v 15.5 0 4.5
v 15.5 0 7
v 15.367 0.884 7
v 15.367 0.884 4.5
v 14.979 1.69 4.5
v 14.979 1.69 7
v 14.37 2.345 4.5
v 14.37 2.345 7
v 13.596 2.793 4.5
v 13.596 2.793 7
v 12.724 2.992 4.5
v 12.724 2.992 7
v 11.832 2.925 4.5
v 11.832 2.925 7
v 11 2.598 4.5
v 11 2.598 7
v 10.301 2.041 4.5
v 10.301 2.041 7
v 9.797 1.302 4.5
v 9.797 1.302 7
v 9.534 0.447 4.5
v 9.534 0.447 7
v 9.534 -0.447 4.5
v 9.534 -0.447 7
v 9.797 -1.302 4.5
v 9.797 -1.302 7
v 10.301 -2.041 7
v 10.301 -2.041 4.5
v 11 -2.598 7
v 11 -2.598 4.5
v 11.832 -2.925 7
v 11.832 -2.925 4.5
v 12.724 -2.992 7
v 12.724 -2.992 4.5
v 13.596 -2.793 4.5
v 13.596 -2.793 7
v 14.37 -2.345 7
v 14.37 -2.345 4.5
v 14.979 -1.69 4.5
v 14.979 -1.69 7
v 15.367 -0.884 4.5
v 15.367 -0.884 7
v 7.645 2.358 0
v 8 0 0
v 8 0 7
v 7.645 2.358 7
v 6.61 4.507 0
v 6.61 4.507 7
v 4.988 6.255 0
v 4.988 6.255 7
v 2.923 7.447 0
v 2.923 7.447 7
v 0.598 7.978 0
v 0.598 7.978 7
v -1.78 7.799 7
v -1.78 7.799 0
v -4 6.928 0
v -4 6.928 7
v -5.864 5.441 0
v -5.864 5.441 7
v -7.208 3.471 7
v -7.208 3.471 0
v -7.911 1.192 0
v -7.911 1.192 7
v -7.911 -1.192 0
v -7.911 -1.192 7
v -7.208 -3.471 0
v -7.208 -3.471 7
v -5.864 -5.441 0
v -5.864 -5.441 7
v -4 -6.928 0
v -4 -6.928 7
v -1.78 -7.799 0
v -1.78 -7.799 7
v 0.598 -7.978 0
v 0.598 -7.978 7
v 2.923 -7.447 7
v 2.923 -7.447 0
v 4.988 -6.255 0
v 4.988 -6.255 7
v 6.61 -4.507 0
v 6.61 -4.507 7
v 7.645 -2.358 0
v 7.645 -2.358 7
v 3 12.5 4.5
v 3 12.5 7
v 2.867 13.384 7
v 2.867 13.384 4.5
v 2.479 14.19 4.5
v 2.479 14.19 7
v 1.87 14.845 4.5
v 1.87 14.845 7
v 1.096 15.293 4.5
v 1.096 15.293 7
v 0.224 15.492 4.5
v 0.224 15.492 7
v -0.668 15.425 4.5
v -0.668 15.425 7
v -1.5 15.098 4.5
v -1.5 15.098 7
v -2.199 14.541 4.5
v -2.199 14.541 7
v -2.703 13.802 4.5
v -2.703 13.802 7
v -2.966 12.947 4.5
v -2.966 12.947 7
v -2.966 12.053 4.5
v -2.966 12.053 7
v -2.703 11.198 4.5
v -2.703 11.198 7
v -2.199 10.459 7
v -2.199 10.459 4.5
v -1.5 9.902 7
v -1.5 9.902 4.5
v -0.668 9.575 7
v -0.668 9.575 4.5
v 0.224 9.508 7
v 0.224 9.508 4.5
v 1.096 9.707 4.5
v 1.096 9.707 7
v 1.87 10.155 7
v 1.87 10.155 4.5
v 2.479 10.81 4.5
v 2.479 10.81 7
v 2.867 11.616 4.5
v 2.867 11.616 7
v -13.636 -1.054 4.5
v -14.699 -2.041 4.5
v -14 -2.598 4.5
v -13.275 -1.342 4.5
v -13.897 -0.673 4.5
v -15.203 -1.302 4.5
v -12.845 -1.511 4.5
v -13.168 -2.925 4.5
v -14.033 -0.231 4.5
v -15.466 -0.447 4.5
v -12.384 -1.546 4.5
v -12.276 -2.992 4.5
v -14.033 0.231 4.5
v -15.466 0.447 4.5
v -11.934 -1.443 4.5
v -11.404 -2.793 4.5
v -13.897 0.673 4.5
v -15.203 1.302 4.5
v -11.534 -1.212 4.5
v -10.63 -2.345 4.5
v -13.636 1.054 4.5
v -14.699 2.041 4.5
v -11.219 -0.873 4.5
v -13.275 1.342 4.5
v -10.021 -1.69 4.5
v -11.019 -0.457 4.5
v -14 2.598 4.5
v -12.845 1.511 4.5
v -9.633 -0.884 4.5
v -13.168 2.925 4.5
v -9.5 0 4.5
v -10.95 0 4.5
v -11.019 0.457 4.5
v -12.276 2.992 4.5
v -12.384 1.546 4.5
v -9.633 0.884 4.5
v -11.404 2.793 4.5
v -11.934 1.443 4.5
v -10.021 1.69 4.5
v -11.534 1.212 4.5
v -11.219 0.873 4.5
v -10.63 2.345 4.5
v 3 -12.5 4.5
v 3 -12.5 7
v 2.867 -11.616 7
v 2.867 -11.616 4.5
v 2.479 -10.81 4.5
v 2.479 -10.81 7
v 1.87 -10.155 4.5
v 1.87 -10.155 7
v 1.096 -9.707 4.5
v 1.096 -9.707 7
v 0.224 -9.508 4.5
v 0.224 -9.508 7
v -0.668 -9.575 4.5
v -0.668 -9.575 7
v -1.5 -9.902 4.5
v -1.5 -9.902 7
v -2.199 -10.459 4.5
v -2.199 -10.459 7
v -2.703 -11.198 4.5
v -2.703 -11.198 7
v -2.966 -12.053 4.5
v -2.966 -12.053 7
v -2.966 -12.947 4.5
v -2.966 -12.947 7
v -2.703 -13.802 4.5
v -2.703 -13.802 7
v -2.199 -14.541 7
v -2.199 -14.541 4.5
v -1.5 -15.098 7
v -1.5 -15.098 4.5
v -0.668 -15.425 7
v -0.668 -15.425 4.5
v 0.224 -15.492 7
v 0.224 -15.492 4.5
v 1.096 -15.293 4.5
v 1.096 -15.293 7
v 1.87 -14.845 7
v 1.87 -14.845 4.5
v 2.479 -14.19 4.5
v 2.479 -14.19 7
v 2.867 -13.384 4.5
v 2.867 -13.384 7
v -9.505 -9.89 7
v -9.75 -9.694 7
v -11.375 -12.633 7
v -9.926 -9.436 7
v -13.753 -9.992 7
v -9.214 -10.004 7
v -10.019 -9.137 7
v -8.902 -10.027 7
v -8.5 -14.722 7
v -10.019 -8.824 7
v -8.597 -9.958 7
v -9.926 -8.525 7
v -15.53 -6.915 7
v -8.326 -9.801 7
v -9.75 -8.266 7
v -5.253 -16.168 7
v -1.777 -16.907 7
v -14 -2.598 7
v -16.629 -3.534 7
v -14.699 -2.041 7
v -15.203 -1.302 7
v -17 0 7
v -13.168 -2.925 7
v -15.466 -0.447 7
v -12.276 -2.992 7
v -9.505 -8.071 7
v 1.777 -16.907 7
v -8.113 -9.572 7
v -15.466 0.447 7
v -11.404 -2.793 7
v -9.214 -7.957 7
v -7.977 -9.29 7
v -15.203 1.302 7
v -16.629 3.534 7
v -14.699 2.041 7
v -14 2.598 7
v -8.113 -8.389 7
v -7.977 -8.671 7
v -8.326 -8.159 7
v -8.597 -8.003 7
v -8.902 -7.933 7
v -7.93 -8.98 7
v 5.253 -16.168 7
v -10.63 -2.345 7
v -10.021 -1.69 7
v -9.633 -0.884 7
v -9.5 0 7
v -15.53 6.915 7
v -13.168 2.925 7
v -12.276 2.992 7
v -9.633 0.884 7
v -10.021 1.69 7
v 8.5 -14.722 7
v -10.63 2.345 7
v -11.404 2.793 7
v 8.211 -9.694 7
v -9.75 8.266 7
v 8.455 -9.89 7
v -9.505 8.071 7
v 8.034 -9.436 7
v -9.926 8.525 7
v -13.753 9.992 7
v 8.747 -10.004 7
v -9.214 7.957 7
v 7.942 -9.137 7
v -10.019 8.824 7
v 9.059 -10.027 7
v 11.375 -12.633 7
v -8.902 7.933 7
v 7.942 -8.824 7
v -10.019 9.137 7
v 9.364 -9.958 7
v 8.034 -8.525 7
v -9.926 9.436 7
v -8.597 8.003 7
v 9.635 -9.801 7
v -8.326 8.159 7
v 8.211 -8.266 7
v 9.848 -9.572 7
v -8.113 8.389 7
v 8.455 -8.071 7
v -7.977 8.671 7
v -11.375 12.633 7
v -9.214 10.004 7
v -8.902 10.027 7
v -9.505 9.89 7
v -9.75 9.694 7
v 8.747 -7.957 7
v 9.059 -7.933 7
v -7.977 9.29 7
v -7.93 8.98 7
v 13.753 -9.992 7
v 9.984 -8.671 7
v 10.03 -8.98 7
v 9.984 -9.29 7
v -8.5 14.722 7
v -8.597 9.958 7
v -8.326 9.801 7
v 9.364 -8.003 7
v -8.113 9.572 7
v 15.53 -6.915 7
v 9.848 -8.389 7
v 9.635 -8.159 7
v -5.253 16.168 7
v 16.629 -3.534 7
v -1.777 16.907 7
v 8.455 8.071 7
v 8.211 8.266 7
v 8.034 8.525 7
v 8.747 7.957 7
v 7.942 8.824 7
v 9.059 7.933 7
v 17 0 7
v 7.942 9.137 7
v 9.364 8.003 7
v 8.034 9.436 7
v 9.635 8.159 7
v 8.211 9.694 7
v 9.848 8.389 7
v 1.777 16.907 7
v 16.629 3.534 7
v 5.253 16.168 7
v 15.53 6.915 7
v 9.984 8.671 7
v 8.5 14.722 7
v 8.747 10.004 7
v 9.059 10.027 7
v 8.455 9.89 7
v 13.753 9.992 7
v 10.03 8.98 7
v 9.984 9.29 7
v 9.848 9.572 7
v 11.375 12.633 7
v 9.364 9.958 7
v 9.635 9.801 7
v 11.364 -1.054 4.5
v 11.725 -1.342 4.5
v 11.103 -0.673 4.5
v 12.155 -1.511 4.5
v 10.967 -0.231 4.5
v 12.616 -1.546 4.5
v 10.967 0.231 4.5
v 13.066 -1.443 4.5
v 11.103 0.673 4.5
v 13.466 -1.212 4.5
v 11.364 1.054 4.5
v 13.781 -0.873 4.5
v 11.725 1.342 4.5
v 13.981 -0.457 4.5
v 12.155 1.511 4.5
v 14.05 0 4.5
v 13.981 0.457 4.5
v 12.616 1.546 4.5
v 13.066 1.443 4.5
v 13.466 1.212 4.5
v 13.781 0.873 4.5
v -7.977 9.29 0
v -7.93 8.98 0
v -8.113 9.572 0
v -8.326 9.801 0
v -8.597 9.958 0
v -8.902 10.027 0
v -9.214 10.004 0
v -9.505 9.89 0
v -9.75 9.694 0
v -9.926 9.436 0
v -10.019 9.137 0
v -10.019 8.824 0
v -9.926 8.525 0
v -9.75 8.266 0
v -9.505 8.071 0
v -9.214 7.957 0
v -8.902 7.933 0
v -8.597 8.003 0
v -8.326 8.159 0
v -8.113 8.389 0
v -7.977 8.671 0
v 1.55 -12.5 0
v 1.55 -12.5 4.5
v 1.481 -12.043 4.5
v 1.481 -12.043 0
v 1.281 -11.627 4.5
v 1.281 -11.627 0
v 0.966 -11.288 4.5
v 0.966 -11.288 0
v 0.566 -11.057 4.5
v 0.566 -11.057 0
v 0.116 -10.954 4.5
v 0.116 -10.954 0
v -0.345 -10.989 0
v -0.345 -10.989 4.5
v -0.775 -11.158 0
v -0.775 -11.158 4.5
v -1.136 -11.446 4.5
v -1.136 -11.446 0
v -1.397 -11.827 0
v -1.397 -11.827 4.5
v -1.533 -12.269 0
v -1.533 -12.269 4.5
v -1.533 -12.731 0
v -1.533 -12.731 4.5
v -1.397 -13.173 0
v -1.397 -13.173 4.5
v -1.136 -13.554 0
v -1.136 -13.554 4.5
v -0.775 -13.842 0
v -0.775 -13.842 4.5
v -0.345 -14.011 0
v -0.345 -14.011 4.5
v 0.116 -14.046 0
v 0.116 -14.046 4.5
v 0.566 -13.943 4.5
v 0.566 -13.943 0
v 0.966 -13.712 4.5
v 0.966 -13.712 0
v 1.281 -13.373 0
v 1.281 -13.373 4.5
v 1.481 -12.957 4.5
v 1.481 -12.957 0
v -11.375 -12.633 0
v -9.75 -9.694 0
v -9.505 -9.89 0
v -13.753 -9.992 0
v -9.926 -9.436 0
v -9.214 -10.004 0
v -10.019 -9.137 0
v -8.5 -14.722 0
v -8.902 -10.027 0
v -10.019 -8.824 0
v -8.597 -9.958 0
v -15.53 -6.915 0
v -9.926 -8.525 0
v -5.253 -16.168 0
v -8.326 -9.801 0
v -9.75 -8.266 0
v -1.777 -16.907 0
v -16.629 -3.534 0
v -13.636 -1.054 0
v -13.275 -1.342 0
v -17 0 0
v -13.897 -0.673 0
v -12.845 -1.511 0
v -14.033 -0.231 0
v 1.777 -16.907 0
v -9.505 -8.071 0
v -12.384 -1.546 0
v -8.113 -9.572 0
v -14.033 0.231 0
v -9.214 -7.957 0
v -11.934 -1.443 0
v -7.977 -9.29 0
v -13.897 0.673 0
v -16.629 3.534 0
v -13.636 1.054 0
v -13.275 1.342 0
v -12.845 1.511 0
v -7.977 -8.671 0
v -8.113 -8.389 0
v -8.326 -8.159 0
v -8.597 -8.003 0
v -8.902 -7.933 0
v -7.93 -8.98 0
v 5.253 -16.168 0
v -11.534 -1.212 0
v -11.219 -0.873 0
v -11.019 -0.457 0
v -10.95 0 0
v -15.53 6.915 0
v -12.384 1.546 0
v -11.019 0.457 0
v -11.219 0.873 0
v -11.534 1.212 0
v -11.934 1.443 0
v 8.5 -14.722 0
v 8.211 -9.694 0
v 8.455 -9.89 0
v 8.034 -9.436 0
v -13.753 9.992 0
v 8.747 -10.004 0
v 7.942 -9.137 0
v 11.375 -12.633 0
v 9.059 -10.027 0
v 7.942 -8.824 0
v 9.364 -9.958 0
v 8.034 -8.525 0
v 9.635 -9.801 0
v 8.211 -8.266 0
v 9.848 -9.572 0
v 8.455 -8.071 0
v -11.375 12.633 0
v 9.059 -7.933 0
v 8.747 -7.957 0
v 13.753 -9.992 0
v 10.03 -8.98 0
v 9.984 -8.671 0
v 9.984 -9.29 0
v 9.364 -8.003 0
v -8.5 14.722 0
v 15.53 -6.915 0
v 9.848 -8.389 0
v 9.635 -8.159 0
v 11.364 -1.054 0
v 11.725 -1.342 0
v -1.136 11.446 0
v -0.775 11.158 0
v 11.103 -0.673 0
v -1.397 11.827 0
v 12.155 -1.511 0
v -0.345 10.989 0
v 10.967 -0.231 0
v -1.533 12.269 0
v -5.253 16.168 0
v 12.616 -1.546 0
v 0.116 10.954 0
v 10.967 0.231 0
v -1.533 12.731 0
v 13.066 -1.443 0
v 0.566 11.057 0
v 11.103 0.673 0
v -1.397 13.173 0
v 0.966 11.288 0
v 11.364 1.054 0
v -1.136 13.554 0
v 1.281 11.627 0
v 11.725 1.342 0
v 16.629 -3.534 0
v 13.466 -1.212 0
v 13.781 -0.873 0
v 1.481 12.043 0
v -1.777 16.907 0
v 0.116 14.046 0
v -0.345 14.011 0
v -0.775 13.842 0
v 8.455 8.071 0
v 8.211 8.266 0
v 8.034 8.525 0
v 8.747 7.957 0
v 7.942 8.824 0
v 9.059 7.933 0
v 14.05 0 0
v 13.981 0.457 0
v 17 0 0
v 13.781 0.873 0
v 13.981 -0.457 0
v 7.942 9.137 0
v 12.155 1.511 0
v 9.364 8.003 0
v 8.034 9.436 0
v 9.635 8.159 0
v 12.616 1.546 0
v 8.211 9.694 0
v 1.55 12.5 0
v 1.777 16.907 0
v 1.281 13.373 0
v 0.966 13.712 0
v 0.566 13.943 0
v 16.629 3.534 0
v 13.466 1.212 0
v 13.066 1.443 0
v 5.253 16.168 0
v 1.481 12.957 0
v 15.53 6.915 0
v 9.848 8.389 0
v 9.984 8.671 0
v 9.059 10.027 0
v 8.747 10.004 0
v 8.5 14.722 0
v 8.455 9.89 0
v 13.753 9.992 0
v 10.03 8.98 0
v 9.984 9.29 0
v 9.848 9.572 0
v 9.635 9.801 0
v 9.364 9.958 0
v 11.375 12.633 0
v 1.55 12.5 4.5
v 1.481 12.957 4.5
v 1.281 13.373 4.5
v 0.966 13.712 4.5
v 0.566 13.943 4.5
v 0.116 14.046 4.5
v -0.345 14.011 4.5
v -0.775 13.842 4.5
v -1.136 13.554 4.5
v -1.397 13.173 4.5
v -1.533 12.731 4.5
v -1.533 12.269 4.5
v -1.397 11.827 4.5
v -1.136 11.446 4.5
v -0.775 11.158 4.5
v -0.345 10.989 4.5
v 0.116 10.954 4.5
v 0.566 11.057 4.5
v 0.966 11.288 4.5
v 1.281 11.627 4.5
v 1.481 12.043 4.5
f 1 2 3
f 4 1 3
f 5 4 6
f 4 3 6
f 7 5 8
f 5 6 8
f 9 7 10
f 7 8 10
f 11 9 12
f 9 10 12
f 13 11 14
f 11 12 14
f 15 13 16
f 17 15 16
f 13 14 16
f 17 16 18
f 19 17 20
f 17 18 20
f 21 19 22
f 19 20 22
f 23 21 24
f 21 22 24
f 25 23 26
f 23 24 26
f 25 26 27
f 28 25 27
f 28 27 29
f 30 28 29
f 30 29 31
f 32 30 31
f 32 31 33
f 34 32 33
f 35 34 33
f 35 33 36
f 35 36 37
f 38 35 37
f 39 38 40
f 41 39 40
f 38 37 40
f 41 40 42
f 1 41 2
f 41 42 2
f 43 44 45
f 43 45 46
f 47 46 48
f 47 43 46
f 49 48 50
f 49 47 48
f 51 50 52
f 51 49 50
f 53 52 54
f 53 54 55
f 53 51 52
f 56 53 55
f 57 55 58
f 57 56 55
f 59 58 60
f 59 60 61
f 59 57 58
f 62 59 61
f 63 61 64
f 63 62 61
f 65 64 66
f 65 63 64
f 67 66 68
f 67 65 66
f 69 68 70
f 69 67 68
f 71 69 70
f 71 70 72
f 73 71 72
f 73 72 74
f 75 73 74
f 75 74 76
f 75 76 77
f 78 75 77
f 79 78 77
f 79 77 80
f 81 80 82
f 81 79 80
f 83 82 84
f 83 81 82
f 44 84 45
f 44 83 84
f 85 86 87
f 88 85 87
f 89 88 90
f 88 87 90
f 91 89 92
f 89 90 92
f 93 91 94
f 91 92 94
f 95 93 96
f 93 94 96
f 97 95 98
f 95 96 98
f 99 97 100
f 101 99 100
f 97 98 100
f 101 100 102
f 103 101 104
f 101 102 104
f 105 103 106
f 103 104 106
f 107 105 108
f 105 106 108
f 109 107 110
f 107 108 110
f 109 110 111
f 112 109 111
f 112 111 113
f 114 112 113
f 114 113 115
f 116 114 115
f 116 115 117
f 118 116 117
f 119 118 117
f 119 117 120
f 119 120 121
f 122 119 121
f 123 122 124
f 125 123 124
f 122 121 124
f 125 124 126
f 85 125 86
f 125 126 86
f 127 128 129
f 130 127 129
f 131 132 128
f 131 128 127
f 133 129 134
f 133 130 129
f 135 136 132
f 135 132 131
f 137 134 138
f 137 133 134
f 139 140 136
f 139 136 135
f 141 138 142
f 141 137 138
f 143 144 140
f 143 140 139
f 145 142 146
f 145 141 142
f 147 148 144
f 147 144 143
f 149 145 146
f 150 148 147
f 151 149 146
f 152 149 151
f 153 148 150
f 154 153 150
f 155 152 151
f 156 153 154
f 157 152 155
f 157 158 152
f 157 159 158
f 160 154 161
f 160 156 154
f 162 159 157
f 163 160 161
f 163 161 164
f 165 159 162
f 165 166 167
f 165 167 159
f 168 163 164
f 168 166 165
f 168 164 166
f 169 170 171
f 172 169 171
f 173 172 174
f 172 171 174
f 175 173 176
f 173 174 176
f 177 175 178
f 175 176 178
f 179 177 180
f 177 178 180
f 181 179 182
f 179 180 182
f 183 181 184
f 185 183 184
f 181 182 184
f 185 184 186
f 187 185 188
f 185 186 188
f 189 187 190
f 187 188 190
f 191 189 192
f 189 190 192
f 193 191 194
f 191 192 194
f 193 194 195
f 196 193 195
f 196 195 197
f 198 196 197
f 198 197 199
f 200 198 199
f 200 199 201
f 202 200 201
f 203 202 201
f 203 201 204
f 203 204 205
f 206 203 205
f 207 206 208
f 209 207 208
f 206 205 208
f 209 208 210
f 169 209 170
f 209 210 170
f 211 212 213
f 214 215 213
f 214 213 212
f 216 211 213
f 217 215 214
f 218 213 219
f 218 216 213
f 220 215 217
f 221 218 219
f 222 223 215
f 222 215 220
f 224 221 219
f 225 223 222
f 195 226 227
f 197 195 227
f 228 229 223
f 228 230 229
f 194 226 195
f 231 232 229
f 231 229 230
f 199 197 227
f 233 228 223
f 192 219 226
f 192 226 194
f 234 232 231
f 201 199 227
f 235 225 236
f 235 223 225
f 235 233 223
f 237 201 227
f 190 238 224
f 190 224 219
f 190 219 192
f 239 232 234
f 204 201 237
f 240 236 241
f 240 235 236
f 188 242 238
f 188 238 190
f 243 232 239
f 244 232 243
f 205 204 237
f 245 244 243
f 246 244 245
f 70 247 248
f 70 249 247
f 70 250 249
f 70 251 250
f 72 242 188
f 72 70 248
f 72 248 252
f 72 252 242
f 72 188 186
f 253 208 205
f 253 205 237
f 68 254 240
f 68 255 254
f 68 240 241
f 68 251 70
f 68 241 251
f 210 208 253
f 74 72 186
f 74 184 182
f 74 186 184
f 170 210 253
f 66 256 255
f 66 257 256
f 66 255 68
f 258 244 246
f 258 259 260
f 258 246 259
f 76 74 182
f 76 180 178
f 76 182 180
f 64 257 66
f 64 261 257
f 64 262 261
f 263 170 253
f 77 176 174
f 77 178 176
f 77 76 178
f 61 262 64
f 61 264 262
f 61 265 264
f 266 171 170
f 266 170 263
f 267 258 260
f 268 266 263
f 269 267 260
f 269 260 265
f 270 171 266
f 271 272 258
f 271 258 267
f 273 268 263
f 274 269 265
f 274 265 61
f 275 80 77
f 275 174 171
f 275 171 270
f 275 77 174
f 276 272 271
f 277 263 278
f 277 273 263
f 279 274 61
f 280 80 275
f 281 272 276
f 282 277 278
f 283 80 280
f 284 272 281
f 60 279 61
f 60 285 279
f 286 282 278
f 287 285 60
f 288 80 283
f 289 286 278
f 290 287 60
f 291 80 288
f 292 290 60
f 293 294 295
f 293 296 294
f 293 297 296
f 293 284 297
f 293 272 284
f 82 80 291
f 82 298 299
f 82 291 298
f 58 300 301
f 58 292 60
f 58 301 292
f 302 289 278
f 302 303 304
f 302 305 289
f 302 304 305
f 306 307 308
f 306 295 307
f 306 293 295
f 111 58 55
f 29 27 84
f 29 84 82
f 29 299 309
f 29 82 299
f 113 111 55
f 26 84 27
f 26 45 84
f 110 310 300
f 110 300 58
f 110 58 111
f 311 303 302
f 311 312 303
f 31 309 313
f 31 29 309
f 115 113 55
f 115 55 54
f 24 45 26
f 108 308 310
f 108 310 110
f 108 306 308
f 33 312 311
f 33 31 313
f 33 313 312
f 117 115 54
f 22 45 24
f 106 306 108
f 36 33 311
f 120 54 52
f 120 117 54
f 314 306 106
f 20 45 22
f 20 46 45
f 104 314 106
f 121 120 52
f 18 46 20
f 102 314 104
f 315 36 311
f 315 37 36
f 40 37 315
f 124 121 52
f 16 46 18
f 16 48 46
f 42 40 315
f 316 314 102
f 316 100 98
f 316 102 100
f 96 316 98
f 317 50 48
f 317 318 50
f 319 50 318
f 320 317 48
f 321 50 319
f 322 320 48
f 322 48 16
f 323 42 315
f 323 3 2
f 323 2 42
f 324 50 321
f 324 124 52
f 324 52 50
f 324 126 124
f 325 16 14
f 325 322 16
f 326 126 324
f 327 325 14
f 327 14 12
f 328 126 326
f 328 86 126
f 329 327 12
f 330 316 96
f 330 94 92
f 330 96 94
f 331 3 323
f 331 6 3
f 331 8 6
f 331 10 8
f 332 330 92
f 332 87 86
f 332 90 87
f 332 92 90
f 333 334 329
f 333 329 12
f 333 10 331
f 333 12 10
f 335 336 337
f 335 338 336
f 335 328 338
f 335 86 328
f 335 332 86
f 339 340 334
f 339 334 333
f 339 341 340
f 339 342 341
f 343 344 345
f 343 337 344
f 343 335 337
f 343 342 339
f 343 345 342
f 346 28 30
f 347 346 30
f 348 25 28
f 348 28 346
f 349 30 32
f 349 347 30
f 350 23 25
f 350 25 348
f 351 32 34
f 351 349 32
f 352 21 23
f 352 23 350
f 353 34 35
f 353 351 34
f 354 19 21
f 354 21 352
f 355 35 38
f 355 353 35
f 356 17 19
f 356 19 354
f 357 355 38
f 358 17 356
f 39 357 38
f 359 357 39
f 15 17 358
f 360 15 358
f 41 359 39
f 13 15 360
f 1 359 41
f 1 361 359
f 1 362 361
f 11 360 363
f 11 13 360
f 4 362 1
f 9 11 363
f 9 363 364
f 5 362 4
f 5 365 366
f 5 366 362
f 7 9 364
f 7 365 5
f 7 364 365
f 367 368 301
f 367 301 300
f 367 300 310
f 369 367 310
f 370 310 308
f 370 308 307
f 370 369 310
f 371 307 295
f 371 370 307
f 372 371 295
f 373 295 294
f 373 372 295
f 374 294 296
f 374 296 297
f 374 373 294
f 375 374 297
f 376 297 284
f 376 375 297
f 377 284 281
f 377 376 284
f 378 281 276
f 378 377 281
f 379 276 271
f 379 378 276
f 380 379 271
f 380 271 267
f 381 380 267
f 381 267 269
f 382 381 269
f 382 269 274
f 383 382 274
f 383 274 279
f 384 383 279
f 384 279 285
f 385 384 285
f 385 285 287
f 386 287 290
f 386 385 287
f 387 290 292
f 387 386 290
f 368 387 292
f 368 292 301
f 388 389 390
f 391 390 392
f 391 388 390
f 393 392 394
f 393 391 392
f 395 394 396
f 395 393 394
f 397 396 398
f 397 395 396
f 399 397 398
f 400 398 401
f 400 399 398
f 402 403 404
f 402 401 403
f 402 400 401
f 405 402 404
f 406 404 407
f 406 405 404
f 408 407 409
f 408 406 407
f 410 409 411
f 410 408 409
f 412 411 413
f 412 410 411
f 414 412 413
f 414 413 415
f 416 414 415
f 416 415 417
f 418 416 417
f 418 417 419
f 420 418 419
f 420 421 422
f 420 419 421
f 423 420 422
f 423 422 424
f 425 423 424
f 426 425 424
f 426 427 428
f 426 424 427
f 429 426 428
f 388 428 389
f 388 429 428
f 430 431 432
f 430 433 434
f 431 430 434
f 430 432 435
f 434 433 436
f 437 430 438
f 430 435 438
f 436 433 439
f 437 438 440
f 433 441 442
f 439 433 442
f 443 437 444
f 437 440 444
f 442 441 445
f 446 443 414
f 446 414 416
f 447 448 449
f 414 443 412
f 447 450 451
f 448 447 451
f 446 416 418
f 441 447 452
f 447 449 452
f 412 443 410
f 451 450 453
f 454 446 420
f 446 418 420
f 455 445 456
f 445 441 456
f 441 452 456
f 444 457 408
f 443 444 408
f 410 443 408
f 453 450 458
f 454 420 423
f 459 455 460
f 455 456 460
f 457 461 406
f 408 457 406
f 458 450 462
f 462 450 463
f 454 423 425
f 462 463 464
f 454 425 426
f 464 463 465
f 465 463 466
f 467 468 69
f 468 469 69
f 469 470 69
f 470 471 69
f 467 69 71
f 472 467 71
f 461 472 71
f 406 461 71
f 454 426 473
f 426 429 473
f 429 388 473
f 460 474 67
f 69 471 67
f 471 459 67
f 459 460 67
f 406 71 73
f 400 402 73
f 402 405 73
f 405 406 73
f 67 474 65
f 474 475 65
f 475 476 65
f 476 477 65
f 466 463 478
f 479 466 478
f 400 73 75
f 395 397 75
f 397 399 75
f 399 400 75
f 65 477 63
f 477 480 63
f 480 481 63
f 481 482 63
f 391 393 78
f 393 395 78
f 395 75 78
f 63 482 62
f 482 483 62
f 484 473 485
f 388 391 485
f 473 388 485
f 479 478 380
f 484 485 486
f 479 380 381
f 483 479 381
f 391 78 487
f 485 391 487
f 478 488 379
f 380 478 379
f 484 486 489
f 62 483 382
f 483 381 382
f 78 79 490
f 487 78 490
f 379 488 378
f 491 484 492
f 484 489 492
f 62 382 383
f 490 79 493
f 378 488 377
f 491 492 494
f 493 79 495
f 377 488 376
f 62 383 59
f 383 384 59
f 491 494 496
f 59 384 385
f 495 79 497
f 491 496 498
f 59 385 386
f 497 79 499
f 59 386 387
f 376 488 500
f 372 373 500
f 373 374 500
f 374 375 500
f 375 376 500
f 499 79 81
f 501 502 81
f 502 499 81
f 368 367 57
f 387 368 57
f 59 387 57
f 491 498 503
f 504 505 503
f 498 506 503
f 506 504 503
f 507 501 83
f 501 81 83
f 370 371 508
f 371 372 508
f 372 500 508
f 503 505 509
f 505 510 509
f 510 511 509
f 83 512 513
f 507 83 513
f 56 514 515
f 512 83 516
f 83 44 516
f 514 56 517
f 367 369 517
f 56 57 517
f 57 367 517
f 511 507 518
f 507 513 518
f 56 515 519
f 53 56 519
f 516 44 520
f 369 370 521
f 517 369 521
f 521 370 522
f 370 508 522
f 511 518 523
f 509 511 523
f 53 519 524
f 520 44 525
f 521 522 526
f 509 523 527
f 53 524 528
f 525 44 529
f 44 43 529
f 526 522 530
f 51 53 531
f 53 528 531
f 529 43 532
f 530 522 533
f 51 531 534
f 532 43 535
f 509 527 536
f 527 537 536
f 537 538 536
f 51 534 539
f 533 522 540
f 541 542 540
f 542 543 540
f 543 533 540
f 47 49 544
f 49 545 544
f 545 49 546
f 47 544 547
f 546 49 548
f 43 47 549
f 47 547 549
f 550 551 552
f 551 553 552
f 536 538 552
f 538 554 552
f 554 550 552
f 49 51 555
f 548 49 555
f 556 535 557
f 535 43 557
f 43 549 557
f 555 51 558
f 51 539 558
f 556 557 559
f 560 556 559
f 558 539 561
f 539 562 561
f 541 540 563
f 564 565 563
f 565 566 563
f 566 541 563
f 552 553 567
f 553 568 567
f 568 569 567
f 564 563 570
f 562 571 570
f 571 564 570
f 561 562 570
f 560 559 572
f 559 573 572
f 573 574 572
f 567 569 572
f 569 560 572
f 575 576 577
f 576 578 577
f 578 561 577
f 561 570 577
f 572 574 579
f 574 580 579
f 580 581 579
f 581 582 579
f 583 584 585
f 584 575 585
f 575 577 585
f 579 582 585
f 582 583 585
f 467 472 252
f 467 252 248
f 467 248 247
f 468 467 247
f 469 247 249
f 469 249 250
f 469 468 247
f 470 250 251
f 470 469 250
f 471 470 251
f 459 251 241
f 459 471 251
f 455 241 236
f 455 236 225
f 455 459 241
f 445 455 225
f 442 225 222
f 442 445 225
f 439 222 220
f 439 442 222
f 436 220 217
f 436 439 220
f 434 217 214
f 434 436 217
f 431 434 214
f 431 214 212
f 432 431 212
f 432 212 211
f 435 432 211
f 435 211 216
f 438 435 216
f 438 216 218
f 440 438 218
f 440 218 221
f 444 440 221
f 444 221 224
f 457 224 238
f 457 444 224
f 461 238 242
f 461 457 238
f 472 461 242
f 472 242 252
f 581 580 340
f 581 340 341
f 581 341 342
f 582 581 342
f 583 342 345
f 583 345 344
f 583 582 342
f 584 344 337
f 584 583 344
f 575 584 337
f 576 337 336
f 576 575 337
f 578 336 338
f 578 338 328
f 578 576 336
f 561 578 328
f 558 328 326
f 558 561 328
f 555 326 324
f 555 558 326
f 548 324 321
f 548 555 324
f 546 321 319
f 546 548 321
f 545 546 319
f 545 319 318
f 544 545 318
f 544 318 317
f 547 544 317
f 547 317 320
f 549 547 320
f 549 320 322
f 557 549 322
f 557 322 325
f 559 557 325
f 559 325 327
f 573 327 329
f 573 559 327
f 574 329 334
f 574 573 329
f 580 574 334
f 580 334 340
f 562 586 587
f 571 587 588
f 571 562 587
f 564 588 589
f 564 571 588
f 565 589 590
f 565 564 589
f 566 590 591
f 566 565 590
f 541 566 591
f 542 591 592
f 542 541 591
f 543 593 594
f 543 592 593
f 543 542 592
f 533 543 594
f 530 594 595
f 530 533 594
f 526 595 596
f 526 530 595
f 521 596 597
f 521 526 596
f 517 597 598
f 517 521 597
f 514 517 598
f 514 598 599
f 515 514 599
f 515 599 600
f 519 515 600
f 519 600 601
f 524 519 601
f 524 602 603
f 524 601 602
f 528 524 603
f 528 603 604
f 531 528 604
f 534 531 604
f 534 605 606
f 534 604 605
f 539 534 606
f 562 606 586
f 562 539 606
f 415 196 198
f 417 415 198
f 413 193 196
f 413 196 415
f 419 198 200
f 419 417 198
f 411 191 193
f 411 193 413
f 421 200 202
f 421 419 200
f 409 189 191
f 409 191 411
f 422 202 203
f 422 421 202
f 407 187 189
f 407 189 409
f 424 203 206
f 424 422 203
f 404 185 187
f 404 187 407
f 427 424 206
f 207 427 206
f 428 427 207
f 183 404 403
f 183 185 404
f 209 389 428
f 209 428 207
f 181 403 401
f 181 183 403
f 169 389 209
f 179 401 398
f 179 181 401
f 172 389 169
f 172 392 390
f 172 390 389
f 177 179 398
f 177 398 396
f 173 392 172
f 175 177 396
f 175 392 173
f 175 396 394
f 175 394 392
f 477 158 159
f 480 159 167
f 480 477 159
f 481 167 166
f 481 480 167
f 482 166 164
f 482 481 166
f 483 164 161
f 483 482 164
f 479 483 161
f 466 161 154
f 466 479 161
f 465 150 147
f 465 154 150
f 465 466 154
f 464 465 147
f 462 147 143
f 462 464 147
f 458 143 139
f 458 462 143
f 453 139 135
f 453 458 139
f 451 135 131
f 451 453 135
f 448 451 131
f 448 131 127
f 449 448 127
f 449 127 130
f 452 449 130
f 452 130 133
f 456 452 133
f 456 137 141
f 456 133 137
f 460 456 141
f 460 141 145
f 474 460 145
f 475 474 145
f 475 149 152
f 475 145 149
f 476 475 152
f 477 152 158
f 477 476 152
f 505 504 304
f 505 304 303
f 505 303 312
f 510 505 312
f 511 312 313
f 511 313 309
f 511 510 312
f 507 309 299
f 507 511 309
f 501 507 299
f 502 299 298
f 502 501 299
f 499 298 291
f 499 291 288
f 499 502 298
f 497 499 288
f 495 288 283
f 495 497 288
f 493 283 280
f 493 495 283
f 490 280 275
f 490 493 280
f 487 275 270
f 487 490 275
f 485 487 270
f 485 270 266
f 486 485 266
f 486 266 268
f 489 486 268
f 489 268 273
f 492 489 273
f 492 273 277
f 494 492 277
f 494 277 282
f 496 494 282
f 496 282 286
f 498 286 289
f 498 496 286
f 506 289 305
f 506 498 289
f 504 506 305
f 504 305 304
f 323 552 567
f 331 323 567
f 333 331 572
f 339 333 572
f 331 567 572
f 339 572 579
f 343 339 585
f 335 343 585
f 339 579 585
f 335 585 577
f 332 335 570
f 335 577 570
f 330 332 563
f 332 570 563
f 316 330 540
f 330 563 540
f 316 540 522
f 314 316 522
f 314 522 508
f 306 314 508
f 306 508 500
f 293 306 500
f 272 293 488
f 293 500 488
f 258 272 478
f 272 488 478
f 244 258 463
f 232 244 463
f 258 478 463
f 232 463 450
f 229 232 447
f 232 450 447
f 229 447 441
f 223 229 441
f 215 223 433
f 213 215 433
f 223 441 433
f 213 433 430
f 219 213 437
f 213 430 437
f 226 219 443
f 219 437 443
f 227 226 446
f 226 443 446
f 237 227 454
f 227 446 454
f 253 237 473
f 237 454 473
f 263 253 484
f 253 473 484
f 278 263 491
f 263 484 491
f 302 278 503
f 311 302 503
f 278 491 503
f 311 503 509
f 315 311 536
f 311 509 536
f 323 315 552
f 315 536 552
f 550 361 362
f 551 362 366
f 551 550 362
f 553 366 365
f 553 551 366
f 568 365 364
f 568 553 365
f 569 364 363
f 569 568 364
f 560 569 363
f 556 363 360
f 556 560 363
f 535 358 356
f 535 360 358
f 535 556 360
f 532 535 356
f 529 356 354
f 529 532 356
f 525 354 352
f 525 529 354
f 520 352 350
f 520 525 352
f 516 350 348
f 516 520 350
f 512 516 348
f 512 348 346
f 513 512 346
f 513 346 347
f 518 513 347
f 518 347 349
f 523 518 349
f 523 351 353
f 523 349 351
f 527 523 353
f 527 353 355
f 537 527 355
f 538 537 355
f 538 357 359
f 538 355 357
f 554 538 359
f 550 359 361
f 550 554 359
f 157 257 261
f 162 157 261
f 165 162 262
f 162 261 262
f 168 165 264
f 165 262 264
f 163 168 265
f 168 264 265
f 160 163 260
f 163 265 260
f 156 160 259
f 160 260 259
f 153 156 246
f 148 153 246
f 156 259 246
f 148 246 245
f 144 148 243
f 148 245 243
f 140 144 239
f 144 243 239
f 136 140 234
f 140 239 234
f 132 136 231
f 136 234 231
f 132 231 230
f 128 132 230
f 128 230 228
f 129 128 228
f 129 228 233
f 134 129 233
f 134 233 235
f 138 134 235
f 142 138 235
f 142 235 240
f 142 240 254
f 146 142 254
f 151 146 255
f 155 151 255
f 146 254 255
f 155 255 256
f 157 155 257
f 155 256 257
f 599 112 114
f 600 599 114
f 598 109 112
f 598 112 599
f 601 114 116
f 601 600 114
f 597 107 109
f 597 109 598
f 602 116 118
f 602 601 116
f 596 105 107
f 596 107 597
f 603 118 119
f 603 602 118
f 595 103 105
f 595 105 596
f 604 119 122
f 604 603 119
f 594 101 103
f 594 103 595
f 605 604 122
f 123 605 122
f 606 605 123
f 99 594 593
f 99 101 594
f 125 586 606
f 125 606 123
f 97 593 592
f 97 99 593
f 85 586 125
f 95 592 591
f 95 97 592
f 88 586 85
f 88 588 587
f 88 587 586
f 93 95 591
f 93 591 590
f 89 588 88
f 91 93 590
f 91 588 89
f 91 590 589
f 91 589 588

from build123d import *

# Parameters (mm, degrees)
SKETCH1_R           = 17
SKETCH1_R_2         = 1.55
SKETCH1_R_3         = 1.05
SKETCH1_R_4         = 8
BOSS_EXTRUDE1_DEPTH = 7
SKETCH2_R           = 3
CUT_EXTRUDE2_DEPTH  = 2.5


with BuildPart() as part:
    # Sketch1 → Boss-Extrude1 (new body)
    with BuildSketch(Plane.XY):
        Circle(SKETCH1_R)
        with Locations((0, 12.5)):
            Circle(SKETCH1_R_2, mode=Mode.SUBTRACT)
        with Locations((12.5, 0)):
            Circle(SKETCH1_R_2, mode=Mode.SUBTRACT)
        with Locations((0, -12.5)):
            Circle(SKETCH1_R_2, mode=Mode.SUBTRACT)
        with Locations((-12.5, 0)):
            Circle(SKETCH1_R_2, mode=Mode.SUBTRACT)
        with Locations((-8.980256121, 8.980256121)):
            Circle(SKETCH1_R_3, mode=Mode.SUBTRACT)
        with Locations((8.980256121, 8.980256121)):
            Circle(SKETCH1_R_3, mode=Mode.SUBTRACT)
        with Locations((8.980256121, -8.980256121)):
            Circle(SKETCH1_R_3, mode=Mode.SUBTRACT)
        with Locations((-8.980256121, -8.980256121)):
            Circle(SKETCH1_R_3, mode=Mode.SUBTRACT)
        Circle(SKETCH1_R_4, mode=Mode.SUBTRACT)
    extrude(amount=BOSS_EXTRUDE1_DEPTH)

    # Sketch2 → Cut-Extrude2 (cut)
    with BuildSketch(Plane.XY.offset(7)):
        with Locations((0, 12.5)):
            Circle(SKETCH2_R)
        with Locations((12.5, 0)):
            Circle(SKETCH2_R)
        with Locations((0, -12.5)):
            Circle(SKETCH2_R)
        with Locations((-12.5, 0)):
            Circle(SKETCH2_R)
    extrude(amount=-CUT_EXTRUDE2_DEPTH, mode=Mode.SUBTRACT)


solid = part.part
